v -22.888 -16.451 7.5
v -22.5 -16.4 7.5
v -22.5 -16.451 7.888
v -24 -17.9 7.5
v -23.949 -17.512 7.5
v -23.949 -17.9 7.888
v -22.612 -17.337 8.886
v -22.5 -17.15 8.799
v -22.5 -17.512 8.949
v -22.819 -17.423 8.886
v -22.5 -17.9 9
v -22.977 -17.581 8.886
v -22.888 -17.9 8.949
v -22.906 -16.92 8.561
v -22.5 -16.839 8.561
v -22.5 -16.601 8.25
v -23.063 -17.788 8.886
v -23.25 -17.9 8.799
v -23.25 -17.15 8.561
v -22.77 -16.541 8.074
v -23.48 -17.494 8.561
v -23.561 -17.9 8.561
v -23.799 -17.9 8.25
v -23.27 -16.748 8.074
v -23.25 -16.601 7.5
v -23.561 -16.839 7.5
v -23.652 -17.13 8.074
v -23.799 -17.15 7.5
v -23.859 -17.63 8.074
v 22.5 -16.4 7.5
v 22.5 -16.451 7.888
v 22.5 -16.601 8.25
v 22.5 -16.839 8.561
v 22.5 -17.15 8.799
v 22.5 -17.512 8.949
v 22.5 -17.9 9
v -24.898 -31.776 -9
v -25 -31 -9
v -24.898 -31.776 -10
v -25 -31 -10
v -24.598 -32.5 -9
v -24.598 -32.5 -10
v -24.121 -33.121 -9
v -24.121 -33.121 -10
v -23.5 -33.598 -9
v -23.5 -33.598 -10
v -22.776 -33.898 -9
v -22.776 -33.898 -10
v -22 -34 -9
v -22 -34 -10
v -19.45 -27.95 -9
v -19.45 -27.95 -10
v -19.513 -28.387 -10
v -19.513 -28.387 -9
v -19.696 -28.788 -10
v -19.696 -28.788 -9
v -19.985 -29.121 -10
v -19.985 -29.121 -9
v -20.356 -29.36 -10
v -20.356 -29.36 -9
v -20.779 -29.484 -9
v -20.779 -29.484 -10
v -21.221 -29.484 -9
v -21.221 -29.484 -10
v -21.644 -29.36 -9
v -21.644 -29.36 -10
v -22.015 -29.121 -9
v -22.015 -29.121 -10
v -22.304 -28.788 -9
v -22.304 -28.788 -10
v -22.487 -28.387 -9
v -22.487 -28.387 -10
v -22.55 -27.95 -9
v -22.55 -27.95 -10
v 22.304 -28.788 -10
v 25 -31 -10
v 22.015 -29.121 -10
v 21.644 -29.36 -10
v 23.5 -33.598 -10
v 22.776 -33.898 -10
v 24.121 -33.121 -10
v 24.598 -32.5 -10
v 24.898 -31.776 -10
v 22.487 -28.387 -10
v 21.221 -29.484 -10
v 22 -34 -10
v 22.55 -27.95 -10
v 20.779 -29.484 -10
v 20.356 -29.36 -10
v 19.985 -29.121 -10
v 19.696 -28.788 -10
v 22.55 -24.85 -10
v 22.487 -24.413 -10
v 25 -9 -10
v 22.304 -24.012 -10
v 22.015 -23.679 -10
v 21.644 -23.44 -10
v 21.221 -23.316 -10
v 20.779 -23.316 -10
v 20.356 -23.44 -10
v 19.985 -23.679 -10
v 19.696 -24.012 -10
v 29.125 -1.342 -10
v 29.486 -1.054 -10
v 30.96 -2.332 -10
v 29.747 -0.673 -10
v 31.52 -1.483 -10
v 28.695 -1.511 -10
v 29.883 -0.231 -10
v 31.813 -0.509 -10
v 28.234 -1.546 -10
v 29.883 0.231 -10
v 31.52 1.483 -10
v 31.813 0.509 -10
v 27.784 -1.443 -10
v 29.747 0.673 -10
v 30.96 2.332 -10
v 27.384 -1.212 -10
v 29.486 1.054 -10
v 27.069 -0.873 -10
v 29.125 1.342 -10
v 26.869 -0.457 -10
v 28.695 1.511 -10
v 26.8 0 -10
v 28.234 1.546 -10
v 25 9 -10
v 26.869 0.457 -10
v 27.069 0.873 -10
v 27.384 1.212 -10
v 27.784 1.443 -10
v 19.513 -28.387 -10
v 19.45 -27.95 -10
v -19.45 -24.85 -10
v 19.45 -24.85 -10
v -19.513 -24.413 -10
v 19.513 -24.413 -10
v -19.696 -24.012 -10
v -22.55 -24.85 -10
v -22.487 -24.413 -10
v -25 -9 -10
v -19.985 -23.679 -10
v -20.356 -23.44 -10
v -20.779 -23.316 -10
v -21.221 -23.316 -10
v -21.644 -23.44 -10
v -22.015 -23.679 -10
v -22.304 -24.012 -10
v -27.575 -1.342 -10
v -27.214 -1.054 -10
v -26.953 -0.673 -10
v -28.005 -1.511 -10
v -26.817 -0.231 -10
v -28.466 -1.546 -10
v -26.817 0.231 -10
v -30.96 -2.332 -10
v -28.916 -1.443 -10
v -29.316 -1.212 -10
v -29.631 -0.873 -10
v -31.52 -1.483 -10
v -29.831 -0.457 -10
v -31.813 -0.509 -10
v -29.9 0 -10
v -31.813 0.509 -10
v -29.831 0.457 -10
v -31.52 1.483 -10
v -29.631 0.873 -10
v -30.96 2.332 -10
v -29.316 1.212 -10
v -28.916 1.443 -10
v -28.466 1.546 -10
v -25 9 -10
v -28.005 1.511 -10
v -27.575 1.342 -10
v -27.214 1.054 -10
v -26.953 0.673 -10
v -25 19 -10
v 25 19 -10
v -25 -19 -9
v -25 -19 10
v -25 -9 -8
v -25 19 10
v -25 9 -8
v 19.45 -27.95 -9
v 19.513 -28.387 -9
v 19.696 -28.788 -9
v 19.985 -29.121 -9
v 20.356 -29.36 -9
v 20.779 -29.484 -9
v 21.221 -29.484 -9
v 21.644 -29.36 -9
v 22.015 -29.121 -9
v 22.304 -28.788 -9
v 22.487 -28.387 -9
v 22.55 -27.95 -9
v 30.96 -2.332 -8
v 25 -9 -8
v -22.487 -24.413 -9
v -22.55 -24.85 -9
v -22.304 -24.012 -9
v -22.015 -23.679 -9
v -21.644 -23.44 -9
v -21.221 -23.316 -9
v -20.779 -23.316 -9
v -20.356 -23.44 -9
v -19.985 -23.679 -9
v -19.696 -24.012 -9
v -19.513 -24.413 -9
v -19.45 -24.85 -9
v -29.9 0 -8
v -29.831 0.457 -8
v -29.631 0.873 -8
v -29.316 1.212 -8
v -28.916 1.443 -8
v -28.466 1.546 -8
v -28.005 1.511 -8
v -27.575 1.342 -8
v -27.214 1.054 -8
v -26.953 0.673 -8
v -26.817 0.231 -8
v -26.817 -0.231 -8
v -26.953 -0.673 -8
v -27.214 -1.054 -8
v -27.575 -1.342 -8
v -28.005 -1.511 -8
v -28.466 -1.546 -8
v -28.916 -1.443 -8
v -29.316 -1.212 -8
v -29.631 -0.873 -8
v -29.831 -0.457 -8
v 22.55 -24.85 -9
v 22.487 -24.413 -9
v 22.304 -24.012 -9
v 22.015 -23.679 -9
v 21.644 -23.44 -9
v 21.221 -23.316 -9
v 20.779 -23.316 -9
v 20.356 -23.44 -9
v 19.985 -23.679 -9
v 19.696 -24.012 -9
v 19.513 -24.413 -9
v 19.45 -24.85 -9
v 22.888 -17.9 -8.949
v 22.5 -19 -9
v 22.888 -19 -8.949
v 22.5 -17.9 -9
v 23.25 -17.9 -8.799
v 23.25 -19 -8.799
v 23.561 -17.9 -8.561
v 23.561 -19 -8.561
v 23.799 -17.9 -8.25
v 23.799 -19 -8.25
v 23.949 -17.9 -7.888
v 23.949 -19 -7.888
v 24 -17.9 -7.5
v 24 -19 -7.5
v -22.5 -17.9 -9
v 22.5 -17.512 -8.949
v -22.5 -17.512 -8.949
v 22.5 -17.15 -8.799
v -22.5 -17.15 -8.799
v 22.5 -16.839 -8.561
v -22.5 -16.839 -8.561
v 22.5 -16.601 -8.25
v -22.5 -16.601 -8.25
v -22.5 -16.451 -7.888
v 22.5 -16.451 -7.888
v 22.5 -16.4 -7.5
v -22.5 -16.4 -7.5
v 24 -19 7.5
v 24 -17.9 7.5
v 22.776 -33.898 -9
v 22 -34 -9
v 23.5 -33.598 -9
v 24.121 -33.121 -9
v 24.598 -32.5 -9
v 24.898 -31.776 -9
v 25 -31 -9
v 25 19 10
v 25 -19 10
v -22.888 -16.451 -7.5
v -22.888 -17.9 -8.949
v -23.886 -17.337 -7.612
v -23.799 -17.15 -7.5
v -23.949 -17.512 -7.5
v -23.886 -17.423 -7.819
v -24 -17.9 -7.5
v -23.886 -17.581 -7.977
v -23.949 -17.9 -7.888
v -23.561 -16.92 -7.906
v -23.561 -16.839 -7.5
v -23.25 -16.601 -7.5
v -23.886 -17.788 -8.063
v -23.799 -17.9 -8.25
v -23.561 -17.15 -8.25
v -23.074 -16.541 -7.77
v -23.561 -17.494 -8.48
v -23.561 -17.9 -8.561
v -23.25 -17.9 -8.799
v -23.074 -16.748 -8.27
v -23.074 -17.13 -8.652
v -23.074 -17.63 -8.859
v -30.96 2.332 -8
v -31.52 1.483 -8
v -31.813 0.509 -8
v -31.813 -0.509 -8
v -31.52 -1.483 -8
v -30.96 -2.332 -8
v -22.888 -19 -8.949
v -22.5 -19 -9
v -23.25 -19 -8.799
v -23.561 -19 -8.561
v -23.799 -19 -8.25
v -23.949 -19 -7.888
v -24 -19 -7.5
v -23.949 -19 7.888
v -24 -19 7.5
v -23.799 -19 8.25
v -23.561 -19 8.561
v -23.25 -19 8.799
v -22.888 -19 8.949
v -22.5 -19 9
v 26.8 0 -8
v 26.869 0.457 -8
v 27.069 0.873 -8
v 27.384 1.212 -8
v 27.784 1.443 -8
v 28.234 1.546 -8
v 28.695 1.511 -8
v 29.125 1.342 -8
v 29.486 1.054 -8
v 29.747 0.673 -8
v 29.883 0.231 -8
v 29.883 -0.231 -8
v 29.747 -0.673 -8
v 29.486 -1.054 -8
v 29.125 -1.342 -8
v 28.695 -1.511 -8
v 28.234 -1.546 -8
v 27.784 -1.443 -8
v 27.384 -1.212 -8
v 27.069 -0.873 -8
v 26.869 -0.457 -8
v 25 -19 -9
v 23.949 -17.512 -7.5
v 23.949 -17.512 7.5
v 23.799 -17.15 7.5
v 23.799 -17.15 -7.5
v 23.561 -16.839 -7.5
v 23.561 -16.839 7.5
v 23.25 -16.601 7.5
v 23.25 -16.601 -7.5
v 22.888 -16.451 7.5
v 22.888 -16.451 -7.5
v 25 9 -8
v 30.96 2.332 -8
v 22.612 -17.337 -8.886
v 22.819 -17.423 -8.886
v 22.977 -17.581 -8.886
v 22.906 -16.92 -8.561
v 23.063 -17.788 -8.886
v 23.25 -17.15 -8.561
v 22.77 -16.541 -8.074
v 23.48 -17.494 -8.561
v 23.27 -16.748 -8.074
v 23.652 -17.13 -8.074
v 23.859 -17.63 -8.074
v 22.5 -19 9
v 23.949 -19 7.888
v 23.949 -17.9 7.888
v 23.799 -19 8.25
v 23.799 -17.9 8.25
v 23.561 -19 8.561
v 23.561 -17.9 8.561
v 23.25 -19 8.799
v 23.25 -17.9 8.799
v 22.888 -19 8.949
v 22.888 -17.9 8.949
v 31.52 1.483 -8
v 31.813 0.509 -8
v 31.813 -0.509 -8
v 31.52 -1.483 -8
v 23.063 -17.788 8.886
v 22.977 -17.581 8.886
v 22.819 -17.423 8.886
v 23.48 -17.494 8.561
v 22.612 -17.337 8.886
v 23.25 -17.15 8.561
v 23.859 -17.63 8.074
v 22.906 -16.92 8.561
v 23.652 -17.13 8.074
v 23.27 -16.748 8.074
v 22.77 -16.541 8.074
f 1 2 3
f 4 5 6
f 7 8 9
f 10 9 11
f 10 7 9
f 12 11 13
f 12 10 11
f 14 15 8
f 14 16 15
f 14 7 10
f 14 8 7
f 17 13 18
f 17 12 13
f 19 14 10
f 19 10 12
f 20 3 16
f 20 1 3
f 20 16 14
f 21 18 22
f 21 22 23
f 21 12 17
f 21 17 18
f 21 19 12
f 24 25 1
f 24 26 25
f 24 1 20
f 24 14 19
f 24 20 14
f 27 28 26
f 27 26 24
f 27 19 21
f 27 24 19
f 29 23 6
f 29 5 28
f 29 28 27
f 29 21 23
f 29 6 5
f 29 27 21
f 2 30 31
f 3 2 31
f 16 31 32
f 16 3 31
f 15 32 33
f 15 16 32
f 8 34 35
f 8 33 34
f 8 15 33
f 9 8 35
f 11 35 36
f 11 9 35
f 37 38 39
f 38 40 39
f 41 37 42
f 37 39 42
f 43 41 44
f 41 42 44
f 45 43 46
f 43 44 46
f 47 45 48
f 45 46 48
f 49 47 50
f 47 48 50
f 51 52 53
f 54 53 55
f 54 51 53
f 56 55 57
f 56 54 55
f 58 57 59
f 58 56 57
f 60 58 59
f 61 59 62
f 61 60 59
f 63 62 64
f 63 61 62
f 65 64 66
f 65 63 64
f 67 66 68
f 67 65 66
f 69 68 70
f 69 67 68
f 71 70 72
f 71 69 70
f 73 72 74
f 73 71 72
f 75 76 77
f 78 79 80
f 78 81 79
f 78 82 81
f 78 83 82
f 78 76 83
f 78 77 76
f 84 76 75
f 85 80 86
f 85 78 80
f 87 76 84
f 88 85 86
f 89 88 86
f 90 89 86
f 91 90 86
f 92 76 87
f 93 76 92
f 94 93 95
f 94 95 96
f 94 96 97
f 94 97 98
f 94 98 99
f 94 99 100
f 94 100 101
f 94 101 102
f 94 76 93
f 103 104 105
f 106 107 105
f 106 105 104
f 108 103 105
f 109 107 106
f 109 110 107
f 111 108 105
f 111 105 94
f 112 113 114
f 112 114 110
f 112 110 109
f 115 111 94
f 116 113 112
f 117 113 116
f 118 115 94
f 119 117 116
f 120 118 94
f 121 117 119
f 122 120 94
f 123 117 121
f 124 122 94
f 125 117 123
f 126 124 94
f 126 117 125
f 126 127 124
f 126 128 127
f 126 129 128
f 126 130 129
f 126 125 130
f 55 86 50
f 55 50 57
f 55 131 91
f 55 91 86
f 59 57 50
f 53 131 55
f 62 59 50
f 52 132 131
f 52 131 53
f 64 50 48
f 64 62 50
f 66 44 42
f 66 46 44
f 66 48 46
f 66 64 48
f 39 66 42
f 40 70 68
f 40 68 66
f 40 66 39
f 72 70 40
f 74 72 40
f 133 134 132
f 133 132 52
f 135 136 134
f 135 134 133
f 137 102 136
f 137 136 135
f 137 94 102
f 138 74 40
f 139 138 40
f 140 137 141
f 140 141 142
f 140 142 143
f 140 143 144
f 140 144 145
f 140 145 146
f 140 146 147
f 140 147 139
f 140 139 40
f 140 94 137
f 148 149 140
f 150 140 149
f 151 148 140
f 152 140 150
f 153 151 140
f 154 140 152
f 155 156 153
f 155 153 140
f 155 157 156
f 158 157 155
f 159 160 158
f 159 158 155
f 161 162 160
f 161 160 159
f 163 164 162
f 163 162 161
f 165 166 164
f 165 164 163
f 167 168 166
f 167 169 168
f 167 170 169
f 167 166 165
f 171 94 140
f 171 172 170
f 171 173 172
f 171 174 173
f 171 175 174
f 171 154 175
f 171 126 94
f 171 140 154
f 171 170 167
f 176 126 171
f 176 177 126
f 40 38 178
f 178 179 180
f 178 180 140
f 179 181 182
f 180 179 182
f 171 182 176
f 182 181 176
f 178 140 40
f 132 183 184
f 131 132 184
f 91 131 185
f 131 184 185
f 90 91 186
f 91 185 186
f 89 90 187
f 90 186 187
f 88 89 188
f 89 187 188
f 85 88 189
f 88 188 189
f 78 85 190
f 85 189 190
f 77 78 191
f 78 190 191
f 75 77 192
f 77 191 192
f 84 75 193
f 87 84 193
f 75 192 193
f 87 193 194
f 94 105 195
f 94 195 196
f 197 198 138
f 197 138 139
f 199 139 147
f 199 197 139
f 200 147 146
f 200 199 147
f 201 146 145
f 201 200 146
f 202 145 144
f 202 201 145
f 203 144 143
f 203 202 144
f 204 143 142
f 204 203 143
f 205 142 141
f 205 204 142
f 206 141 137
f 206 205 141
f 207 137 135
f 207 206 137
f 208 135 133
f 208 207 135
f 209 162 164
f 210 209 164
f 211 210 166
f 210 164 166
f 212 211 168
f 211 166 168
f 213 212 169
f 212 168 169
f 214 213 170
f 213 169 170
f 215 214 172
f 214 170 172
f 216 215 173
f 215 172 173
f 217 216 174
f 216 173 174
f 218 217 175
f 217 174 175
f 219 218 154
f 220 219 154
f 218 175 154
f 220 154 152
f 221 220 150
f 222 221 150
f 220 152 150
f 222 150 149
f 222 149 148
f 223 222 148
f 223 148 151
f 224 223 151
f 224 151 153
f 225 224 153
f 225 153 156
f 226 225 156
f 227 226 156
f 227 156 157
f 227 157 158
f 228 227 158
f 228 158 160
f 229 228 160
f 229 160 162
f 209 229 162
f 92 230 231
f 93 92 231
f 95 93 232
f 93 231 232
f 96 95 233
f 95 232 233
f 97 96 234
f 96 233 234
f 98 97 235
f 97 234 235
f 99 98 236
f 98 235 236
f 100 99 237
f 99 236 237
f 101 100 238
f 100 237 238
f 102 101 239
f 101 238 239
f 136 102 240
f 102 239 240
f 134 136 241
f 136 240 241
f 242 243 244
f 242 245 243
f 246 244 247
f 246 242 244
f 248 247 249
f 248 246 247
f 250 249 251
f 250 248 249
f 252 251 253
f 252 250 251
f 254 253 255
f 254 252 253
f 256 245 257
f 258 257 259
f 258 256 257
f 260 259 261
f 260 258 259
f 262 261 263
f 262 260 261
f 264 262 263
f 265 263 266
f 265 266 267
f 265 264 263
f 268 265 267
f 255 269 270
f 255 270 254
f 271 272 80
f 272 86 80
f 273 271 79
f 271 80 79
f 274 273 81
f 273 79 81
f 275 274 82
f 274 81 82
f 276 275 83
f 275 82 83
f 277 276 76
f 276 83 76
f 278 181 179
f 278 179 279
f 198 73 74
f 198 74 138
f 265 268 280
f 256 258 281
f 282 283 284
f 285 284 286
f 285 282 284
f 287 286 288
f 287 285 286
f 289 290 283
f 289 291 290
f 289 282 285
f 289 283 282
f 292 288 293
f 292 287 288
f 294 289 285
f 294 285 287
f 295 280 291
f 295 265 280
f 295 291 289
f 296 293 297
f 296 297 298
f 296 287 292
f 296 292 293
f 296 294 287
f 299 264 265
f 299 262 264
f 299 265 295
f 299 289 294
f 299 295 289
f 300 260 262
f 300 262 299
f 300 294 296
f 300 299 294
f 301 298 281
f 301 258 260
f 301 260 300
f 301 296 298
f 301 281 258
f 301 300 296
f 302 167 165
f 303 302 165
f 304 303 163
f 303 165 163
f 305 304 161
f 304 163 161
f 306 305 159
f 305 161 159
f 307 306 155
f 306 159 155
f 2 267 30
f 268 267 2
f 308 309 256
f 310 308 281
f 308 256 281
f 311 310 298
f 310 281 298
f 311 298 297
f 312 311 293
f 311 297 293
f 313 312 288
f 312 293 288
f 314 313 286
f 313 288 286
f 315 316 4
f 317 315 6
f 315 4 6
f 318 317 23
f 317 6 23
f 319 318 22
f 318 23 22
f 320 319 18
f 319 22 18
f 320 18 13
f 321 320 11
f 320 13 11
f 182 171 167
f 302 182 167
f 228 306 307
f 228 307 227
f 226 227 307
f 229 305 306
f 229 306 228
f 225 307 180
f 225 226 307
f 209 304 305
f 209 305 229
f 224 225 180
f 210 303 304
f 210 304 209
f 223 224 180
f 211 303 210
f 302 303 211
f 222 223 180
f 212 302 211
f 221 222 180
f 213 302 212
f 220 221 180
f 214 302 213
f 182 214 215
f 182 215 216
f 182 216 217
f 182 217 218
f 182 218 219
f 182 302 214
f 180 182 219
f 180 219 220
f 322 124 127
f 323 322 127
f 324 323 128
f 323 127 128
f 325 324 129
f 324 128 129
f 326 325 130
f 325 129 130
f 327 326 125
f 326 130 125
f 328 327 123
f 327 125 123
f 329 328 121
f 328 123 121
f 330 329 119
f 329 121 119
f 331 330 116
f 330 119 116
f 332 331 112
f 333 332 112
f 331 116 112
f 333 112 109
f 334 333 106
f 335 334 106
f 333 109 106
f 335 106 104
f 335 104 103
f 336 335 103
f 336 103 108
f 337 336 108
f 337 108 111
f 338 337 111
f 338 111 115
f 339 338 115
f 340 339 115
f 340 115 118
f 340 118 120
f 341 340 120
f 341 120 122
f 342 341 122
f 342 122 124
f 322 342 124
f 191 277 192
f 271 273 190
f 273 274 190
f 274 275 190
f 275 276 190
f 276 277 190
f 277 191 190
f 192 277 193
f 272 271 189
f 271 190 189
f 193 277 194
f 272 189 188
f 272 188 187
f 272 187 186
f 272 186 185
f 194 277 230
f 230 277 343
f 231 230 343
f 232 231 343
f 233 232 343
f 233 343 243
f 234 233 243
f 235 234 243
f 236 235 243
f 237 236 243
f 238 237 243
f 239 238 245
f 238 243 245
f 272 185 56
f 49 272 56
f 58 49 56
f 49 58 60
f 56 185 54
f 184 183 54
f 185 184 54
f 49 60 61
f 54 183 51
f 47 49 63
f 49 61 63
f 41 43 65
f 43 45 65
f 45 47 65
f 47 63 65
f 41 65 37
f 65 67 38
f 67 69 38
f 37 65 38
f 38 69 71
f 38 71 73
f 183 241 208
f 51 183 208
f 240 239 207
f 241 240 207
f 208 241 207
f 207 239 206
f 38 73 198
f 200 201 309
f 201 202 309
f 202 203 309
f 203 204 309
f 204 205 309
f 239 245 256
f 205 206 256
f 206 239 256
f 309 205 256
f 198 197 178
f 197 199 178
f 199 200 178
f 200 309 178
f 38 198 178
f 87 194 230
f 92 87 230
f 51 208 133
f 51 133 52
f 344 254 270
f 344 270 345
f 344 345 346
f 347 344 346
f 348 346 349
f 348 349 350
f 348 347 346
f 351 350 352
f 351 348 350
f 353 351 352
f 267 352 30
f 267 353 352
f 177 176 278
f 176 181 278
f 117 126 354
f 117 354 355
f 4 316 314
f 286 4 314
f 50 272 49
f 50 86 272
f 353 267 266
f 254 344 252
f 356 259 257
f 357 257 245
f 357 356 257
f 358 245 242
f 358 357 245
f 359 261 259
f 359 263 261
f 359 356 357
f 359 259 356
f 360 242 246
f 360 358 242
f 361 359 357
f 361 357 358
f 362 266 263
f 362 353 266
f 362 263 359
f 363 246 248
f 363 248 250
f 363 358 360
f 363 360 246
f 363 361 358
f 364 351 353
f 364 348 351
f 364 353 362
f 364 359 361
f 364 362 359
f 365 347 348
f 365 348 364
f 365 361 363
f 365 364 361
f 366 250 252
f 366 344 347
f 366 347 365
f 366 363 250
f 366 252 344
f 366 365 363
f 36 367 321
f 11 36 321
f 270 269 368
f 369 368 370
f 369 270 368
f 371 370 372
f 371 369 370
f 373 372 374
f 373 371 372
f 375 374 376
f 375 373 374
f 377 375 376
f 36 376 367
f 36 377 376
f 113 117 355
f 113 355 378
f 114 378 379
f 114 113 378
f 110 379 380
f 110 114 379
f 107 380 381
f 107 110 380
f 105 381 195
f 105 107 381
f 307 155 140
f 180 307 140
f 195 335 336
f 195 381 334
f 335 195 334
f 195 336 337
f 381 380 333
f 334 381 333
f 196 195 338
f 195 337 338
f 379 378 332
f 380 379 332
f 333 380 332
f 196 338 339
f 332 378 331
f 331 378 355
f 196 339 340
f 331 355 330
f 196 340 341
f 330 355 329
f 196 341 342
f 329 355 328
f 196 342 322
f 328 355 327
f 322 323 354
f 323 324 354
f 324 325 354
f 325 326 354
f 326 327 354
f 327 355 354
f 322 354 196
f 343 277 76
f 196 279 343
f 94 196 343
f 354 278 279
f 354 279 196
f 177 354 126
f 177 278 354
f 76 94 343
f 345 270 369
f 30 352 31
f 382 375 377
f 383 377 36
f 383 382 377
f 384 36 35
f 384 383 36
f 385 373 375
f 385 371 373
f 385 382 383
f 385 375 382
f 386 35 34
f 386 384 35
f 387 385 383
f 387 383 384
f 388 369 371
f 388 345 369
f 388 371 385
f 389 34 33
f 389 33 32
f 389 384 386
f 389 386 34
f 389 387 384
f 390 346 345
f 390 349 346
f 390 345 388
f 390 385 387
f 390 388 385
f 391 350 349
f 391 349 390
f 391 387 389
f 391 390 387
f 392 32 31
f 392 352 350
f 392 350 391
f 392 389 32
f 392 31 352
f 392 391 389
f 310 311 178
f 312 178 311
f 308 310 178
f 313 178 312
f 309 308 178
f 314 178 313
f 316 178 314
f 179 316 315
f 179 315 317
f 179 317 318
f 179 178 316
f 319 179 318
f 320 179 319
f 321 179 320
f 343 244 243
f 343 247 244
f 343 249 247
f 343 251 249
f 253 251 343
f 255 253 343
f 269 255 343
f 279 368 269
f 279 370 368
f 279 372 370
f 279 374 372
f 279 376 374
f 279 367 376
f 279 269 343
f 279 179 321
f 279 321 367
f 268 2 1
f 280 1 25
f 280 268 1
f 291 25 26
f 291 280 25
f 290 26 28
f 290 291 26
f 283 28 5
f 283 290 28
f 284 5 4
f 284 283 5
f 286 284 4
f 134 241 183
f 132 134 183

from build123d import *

# Parameters (mm, degrees)
SKETCH1_W                  = 50
SKETCH1_H                  = 38
MAIN_BODY_DEPTH            = 10
SIDE_MOUNTING_BODY_DEPTH   = 2
F_3_1_3_1_DIAMETER_HOLE1_D = 3.1
SKETCH5_W                  = 48
SKETCH5_H                  = 18
BOTTOM_CUT_DEPTH           = 2.6
SKETCH6_W                  = 50
SKETCH6_H                  = 1
BOTTOM_MOUNTING_TAB_DEPTH  = 15
SLOT_DEPTH                 = 2
FILLET1_R                  = 1.5
FILLET2_R                  = 3


with BuildPart() as part:
    # Sketch1 → MAIN BODY (new body, symmetric)
    with BuildSketch(Plane.XY):
        Rectangle(SKETCH1_W, SKETCH1_H)
    extrude(amount=MAIN_BODY_DEPTH, both=True)

    # Sketch2 → SIDE MOUNTING BODY (add)
    with BuildSketch(Plane(origin=(0, 0, -10), x_dir=(-1, 0, 0), z_dir=(0, 0, -1))):
        with BuildLine():
            Line((30.959543616, -2.332441235), (25, -9))
            Line((25, -9), (25, 9))
            Line((25, 9), (30.959543616, 2.332441235))
            ThreePointArc((30.959543616, 2.332441235), (31.85, 0), (30.959543616, -2.332441235))
        make_face()
    side_mounting_body = extrude(amount=-SIDE_MOUNTING_BODY_DEPTH)

    # Mirror1: SIDE MOUNTING BODY across plane
    add(side_mounting_body.mirror(Plane(origin=(0, 0, 0), x_dir=(0, 0, 1), z_dir=(1, 0, 0))))

    # Ø3.1 (3.1) Diameter Hole1 (through all)
    with Locations(Plane.XY.offset(-8)):
        with Locations((-28.35, 0), (28.35, 0)):
            Hole(F_3_1_3_1_DIAMETER_HOLE1_D / 2)

    # Sketch5 → BOTTOM CUT (cut)
    with BuildSketch(Plane(origin=(0, -19, 0), x_dir=(-1, 0, 0), z_dir=(0, -1, 0))):
        Rectangle(SKETCH5_W, SKETCH5_H)
    extrude(amount=-BOTTOM_CUT_DEPTH, mode=Mode.SUBTRACT)

    # Sketch6 → BOTTOM MOUNTING TAB (add)
    with BuildSketch(Plane(origin=(0, -19, 0), x_dir=(-1, 0, 0), z_dir=(0, -1, 0))):
        with Locations((0, 9.5)):
            Rectangle(SKETCH6_W, SKETCH6_H)
    extrude(amount=BOTTOM_MOUNTING_TAB_DEPTH)

    # Sketch7 → SLOT (cut, through all)
    with BuildSketch(Plane.XY.offset(-9)):
        with BuildLine():
            Line((-19.45, -24.85), (-19.45, -27.95))
            ThreePointArc((-19.45, -27.95), (-21, -29.5), (-22.55, -27.95))
            Line((-22.55, -27.95), (-22.55, -24.85))
            ThreePointArc((-22.55, -24.85), (-21, -23.3), (-19.45, -24.85))
        make_face()
    slot = extrude(amount=-SLOT_DEPTH, mode=Mode.SUBTRACT)

    # Mirror2: SLOT across plane
    add(slot.mirror(Plane(origin=(0, 0, 0), x_dir=(0, 0, 1), z_dir=(1, 0, 0))), mode=Mode.SUBTRACT)

    # Fillet1
    fillet1_edges = [part.edges().sort_by_distance(p)[0] for p in [
        (24, -16.4, 0),
        (24, -17.7, 9),
        (0, -16.4, -9),
        (24, -17.7, -9),
        (-24, -16.4, 0),
        (-24, -17.7, -9),
        (0, -16.4, 9),
        (-24, -17.7, 9),
    ]]
    fillet(fillet1_edges, radius=FILLET1_R)

    # Fillet2
    fillet2_edges = [part.edges().sort_by_distance(p)[0] for p in [
        (25, -34, -9.5),
        (-25, -34, -9.5),
    ]]
    fillet(fillet2_edges, radius=FILLET2_R)


solid = part.part
